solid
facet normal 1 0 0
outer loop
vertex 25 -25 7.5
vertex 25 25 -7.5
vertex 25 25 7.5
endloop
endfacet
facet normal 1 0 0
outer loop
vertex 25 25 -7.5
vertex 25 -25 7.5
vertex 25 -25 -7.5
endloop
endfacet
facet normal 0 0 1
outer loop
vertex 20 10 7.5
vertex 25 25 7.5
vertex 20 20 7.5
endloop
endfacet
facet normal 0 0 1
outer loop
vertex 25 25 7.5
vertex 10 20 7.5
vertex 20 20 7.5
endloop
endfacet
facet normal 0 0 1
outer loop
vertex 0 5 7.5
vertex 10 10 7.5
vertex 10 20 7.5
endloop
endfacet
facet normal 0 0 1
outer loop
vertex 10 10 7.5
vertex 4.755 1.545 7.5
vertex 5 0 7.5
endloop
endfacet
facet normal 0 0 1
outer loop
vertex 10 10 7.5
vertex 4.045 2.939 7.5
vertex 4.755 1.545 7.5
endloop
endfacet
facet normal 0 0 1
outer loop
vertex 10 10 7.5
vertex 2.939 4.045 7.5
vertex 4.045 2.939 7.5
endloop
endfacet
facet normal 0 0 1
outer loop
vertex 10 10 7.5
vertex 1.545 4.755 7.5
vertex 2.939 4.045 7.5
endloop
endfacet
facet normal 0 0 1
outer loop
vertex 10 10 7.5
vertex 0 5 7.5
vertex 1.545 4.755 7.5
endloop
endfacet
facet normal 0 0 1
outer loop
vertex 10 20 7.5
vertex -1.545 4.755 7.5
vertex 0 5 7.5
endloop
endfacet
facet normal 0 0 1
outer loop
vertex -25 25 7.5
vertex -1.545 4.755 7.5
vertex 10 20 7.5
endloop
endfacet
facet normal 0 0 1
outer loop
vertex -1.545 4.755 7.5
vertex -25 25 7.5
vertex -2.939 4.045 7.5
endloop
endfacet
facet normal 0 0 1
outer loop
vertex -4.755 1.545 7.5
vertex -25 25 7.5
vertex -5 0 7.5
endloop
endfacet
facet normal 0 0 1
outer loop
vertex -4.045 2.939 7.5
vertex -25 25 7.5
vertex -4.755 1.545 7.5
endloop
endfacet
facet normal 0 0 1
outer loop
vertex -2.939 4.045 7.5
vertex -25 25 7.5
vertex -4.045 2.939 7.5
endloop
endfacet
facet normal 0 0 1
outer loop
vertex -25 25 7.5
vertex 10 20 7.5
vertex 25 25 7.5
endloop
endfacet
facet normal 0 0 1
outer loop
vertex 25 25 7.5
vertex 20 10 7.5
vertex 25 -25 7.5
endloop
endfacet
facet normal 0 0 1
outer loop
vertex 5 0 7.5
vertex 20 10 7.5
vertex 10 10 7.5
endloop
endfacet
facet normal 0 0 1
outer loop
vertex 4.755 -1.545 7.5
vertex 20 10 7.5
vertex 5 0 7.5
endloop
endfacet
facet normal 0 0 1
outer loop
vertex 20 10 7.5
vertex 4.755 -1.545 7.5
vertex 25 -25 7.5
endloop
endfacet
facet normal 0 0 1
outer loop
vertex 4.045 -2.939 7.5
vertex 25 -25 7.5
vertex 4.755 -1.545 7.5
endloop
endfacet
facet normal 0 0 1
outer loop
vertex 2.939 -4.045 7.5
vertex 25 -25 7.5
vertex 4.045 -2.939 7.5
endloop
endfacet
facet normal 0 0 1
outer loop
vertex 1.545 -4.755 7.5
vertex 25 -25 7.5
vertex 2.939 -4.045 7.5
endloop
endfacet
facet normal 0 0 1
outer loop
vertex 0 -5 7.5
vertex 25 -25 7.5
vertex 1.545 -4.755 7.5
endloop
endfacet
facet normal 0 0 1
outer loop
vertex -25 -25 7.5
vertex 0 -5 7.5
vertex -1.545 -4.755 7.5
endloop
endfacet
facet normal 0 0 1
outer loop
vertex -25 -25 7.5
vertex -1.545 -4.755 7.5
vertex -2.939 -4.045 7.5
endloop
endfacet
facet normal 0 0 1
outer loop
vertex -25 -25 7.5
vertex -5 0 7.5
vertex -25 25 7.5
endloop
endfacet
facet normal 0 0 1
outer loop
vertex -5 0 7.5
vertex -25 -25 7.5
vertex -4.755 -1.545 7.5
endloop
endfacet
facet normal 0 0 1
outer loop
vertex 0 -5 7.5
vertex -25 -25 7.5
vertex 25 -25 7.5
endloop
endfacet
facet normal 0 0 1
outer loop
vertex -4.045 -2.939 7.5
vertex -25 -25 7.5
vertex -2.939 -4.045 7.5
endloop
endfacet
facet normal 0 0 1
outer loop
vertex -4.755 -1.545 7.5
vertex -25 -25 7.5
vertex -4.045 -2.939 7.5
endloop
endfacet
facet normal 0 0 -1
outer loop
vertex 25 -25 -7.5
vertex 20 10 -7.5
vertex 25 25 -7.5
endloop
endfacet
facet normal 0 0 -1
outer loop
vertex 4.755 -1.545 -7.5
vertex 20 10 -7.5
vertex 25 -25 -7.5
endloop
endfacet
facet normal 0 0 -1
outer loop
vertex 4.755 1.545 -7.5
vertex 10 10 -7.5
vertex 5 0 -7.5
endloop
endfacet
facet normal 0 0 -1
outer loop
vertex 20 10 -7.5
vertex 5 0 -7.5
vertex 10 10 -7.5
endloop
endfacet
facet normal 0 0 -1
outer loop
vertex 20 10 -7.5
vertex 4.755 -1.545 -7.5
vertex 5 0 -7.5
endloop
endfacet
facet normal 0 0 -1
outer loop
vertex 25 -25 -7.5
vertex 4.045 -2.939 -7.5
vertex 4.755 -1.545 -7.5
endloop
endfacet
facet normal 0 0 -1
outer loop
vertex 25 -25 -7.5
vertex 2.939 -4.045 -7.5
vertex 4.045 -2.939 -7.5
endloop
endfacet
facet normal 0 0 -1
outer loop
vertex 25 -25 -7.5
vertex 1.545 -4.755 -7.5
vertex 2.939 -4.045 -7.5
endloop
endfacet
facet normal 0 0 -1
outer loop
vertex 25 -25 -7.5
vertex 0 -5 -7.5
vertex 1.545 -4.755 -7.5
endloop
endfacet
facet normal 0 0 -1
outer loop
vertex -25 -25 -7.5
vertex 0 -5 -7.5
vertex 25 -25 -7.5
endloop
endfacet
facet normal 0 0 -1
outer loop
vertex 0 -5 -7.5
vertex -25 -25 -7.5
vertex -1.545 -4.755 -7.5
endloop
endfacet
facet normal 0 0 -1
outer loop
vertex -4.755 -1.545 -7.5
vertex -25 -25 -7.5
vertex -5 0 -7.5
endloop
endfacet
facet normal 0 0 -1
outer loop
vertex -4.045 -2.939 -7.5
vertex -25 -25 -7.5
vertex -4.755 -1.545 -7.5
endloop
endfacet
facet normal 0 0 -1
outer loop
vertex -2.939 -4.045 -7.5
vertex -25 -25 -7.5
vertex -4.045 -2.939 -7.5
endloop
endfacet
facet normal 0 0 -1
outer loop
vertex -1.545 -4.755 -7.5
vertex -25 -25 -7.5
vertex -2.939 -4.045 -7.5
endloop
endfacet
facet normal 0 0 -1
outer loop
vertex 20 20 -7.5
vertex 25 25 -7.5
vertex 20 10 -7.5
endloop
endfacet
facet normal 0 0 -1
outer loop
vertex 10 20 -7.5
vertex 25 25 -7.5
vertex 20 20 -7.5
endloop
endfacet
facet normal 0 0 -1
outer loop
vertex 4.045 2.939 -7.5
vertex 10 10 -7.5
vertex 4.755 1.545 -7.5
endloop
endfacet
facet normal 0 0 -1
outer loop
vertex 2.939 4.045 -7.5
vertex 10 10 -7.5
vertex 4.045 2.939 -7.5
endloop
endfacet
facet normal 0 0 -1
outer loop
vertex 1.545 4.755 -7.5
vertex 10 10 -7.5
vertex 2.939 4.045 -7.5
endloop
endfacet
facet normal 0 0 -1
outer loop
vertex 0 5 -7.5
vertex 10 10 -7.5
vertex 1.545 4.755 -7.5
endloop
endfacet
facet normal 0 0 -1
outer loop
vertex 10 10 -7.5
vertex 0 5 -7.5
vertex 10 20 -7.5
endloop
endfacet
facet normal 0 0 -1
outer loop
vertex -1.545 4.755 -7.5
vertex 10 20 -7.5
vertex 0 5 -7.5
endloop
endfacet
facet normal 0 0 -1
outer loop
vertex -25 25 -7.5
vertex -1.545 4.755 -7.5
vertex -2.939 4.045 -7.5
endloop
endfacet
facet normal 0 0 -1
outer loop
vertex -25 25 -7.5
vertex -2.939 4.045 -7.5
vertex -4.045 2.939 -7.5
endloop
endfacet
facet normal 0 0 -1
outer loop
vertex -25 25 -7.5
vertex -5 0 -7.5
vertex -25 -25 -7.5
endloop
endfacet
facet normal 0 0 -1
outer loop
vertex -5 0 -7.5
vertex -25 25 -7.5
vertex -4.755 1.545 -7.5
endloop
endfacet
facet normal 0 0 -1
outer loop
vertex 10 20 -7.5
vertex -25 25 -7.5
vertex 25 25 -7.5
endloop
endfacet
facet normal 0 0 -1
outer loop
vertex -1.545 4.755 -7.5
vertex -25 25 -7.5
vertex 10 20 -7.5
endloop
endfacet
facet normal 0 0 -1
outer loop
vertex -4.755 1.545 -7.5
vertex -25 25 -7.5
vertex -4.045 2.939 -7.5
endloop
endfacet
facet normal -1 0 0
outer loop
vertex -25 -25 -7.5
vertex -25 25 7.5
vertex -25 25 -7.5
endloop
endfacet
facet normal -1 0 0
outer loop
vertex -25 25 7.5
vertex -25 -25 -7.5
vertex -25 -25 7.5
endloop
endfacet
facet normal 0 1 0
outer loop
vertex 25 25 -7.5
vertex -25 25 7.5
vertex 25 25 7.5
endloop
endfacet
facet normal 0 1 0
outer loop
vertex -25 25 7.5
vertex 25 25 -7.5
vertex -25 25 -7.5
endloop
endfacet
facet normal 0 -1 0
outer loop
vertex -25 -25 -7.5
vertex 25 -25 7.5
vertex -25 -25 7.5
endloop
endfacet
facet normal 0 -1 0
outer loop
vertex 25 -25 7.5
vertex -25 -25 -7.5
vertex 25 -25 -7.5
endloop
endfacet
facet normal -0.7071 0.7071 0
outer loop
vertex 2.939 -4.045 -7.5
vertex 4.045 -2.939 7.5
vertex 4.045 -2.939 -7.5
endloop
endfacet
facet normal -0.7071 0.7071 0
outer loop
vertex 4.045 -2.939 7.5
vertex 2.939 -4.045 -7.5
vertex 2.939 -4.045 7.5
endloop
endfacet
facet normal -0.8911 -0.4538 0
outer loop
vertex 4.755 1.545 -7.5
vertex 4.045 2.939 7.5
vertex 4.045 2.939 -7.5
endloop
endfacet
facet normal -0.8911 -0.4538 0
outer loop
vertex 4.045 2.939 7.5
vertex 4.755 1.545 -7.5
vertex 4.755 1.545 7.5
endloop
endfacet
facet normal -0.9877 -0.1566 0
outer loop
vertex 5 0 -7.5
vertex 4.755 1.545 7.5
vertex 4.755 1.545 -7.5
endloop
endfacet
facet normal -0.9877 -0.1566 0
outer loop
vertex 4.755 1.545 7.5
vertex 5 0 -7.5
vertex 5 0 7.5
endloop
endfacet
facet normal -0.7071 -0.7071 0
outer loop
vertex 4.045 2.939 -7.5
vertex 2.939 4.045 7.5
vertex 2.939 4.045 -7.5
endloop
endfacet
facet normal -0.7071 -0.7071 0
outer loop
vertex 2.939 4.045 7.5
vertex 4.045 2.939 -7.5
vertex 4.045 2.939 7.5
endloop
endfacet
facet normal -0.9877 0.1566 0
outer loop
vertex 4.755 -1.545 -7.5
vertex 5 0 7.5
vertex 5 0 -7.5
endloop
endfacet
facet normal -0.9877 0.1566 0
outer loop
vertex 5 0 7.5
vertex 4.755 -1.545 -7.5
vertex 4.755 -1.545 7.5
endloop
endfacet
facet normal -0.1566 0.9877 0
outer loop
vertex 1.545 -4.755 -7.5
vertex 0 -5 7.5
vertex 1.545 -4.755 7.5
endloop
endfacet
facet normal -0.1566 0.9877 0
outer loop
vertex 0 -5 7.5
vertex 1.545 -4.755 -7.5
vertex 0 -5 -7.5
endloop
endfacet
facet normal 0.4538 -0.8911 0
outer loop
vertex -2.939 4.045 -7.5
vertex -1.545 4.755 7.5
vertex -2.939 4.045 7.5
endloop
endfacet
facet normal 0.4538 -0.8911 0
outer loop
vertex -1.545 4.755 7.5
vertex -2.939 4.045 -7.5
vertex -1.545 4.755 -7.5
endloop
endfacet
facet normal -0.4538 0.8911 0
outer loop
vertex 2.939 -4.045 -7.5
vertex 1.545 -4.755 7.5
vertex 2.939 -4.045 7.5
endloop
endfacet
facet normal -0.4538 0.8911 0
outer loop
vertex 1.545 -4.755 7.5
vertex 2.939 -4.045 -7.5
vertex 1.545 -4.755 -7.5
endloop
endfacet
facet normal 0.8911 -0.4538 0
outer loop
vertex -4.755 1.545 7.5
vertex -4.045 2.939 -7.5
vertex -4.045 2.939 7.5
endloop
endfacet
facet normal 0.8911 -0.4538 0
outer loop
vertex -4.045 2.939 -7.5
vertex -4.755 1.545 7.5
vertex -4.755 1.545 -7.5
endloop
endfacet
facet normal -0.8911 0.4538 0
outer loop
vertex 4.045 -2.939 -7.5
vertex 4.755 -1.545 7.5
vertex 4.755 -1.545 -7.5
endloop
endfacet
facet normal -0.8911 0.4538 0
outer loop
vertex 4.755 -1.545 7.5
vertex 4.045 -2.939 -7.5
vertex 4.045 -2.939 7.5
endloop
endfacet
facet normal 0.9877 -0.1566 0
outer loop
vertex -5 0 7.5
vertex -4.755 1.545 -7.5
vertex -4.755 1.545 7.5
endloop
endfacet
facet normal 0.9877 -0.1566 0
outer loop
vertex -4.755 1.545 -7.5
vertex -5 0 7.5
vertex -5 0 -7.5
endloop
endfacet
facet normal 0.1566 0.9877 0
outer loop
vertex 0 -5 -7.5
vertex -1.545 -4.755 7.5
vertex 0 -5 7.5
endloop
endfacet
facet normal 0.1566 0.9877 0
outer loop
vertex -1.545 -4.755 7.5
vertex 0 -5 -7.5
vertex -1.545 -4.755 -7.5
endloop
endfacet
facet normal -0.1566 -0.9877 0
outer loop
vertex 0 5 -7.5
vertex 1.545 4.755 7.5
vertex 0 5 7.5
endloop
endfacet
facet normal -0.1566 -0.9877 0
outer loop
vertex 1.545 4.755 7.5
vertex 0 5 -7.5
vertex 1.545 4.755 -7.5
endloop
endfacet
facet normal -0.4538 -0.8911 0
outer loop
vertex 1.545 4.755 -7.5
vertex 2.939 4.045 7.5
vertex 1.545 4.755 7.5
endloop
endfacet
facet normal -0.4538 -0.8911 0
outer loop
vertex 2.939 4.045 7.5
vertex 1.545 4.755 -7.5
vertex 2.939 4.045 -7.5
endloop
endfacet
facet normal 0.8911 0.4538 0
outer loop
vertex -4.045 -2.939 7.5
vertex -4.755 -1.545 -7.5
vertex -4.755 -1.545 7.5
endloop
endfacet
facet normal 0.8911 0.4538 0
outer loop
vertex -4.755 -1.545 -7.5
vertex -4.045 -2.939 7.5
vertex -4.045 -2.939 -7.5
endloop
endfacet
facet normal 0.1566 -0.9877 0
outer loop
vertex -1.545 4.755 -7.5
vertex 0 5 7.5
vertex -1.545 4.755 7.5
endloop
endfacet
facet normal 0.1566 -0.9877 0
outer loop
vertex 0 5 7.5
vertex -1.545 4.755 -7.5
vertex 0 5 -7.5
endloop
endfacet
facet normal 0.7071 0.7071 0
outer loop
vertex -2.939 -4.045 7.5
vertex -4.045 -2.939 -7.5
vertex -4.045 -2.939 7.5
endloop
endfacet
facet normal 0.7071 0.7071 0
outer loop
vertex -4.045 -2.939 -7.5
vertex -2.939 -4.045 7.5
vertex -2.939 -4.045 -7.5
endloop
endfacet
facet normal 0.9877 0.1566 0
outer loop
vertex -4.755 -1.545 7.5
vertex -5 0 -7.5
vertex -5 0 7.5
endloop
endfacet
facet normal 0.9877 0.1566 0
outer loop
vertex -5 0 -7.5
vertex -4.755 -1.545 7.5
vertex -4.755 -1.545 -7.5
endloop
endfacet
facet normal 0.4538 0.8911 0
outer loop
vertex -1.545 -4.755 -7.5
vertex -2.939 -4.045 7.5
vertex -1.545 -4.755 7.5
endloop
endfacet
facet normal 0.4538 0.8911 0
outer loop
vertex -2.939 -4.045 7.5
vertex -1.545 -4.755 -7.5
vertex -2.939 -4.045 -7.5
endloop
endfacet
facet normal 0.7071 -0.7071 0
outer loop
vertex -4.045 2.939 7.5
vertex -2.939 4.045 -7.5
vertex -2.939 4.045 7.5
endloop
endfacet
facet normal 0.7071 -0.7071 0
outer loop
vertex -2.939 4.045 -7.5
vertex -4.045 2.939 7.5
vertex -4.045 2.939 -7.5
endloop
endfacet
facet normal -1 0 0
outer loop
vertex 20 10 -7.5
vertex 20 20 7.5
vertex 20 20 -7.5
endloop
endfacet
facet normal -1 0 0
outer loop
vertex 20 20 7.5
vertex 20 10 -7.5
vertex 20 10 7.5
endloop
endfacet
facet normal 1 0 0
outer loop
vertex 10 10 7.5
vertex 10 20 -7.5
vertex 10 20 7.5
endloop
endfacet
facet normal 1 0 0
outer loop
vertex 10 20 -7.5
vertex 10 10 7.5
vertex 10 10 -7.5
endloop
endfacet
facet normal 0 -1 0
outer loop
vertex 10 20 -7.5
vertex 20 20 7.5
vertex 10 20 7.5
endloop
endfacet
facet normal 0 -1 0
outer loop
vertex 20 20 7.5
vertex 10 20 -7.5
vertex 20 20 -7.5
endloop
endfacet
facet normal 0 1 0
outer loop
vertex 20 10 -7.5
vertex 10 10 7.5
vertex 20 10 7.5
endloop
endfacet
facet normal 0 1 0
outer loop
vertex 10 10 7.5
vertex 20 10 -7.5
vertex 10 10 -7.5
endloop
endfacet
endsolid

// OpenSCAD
// Volume: 34841.18642117555, SurfaceArea: 8714.794887553644
$fn = 20;

difference() {
    resize([50, 50, 15], convexity = 2) {
        difference() {
            cube([10, 10, 5], center = true);
            cylinder(8, center = true);
        }
    }
    translate([15, 15, 0]) cube([10, 10, 20], center = true);
}
